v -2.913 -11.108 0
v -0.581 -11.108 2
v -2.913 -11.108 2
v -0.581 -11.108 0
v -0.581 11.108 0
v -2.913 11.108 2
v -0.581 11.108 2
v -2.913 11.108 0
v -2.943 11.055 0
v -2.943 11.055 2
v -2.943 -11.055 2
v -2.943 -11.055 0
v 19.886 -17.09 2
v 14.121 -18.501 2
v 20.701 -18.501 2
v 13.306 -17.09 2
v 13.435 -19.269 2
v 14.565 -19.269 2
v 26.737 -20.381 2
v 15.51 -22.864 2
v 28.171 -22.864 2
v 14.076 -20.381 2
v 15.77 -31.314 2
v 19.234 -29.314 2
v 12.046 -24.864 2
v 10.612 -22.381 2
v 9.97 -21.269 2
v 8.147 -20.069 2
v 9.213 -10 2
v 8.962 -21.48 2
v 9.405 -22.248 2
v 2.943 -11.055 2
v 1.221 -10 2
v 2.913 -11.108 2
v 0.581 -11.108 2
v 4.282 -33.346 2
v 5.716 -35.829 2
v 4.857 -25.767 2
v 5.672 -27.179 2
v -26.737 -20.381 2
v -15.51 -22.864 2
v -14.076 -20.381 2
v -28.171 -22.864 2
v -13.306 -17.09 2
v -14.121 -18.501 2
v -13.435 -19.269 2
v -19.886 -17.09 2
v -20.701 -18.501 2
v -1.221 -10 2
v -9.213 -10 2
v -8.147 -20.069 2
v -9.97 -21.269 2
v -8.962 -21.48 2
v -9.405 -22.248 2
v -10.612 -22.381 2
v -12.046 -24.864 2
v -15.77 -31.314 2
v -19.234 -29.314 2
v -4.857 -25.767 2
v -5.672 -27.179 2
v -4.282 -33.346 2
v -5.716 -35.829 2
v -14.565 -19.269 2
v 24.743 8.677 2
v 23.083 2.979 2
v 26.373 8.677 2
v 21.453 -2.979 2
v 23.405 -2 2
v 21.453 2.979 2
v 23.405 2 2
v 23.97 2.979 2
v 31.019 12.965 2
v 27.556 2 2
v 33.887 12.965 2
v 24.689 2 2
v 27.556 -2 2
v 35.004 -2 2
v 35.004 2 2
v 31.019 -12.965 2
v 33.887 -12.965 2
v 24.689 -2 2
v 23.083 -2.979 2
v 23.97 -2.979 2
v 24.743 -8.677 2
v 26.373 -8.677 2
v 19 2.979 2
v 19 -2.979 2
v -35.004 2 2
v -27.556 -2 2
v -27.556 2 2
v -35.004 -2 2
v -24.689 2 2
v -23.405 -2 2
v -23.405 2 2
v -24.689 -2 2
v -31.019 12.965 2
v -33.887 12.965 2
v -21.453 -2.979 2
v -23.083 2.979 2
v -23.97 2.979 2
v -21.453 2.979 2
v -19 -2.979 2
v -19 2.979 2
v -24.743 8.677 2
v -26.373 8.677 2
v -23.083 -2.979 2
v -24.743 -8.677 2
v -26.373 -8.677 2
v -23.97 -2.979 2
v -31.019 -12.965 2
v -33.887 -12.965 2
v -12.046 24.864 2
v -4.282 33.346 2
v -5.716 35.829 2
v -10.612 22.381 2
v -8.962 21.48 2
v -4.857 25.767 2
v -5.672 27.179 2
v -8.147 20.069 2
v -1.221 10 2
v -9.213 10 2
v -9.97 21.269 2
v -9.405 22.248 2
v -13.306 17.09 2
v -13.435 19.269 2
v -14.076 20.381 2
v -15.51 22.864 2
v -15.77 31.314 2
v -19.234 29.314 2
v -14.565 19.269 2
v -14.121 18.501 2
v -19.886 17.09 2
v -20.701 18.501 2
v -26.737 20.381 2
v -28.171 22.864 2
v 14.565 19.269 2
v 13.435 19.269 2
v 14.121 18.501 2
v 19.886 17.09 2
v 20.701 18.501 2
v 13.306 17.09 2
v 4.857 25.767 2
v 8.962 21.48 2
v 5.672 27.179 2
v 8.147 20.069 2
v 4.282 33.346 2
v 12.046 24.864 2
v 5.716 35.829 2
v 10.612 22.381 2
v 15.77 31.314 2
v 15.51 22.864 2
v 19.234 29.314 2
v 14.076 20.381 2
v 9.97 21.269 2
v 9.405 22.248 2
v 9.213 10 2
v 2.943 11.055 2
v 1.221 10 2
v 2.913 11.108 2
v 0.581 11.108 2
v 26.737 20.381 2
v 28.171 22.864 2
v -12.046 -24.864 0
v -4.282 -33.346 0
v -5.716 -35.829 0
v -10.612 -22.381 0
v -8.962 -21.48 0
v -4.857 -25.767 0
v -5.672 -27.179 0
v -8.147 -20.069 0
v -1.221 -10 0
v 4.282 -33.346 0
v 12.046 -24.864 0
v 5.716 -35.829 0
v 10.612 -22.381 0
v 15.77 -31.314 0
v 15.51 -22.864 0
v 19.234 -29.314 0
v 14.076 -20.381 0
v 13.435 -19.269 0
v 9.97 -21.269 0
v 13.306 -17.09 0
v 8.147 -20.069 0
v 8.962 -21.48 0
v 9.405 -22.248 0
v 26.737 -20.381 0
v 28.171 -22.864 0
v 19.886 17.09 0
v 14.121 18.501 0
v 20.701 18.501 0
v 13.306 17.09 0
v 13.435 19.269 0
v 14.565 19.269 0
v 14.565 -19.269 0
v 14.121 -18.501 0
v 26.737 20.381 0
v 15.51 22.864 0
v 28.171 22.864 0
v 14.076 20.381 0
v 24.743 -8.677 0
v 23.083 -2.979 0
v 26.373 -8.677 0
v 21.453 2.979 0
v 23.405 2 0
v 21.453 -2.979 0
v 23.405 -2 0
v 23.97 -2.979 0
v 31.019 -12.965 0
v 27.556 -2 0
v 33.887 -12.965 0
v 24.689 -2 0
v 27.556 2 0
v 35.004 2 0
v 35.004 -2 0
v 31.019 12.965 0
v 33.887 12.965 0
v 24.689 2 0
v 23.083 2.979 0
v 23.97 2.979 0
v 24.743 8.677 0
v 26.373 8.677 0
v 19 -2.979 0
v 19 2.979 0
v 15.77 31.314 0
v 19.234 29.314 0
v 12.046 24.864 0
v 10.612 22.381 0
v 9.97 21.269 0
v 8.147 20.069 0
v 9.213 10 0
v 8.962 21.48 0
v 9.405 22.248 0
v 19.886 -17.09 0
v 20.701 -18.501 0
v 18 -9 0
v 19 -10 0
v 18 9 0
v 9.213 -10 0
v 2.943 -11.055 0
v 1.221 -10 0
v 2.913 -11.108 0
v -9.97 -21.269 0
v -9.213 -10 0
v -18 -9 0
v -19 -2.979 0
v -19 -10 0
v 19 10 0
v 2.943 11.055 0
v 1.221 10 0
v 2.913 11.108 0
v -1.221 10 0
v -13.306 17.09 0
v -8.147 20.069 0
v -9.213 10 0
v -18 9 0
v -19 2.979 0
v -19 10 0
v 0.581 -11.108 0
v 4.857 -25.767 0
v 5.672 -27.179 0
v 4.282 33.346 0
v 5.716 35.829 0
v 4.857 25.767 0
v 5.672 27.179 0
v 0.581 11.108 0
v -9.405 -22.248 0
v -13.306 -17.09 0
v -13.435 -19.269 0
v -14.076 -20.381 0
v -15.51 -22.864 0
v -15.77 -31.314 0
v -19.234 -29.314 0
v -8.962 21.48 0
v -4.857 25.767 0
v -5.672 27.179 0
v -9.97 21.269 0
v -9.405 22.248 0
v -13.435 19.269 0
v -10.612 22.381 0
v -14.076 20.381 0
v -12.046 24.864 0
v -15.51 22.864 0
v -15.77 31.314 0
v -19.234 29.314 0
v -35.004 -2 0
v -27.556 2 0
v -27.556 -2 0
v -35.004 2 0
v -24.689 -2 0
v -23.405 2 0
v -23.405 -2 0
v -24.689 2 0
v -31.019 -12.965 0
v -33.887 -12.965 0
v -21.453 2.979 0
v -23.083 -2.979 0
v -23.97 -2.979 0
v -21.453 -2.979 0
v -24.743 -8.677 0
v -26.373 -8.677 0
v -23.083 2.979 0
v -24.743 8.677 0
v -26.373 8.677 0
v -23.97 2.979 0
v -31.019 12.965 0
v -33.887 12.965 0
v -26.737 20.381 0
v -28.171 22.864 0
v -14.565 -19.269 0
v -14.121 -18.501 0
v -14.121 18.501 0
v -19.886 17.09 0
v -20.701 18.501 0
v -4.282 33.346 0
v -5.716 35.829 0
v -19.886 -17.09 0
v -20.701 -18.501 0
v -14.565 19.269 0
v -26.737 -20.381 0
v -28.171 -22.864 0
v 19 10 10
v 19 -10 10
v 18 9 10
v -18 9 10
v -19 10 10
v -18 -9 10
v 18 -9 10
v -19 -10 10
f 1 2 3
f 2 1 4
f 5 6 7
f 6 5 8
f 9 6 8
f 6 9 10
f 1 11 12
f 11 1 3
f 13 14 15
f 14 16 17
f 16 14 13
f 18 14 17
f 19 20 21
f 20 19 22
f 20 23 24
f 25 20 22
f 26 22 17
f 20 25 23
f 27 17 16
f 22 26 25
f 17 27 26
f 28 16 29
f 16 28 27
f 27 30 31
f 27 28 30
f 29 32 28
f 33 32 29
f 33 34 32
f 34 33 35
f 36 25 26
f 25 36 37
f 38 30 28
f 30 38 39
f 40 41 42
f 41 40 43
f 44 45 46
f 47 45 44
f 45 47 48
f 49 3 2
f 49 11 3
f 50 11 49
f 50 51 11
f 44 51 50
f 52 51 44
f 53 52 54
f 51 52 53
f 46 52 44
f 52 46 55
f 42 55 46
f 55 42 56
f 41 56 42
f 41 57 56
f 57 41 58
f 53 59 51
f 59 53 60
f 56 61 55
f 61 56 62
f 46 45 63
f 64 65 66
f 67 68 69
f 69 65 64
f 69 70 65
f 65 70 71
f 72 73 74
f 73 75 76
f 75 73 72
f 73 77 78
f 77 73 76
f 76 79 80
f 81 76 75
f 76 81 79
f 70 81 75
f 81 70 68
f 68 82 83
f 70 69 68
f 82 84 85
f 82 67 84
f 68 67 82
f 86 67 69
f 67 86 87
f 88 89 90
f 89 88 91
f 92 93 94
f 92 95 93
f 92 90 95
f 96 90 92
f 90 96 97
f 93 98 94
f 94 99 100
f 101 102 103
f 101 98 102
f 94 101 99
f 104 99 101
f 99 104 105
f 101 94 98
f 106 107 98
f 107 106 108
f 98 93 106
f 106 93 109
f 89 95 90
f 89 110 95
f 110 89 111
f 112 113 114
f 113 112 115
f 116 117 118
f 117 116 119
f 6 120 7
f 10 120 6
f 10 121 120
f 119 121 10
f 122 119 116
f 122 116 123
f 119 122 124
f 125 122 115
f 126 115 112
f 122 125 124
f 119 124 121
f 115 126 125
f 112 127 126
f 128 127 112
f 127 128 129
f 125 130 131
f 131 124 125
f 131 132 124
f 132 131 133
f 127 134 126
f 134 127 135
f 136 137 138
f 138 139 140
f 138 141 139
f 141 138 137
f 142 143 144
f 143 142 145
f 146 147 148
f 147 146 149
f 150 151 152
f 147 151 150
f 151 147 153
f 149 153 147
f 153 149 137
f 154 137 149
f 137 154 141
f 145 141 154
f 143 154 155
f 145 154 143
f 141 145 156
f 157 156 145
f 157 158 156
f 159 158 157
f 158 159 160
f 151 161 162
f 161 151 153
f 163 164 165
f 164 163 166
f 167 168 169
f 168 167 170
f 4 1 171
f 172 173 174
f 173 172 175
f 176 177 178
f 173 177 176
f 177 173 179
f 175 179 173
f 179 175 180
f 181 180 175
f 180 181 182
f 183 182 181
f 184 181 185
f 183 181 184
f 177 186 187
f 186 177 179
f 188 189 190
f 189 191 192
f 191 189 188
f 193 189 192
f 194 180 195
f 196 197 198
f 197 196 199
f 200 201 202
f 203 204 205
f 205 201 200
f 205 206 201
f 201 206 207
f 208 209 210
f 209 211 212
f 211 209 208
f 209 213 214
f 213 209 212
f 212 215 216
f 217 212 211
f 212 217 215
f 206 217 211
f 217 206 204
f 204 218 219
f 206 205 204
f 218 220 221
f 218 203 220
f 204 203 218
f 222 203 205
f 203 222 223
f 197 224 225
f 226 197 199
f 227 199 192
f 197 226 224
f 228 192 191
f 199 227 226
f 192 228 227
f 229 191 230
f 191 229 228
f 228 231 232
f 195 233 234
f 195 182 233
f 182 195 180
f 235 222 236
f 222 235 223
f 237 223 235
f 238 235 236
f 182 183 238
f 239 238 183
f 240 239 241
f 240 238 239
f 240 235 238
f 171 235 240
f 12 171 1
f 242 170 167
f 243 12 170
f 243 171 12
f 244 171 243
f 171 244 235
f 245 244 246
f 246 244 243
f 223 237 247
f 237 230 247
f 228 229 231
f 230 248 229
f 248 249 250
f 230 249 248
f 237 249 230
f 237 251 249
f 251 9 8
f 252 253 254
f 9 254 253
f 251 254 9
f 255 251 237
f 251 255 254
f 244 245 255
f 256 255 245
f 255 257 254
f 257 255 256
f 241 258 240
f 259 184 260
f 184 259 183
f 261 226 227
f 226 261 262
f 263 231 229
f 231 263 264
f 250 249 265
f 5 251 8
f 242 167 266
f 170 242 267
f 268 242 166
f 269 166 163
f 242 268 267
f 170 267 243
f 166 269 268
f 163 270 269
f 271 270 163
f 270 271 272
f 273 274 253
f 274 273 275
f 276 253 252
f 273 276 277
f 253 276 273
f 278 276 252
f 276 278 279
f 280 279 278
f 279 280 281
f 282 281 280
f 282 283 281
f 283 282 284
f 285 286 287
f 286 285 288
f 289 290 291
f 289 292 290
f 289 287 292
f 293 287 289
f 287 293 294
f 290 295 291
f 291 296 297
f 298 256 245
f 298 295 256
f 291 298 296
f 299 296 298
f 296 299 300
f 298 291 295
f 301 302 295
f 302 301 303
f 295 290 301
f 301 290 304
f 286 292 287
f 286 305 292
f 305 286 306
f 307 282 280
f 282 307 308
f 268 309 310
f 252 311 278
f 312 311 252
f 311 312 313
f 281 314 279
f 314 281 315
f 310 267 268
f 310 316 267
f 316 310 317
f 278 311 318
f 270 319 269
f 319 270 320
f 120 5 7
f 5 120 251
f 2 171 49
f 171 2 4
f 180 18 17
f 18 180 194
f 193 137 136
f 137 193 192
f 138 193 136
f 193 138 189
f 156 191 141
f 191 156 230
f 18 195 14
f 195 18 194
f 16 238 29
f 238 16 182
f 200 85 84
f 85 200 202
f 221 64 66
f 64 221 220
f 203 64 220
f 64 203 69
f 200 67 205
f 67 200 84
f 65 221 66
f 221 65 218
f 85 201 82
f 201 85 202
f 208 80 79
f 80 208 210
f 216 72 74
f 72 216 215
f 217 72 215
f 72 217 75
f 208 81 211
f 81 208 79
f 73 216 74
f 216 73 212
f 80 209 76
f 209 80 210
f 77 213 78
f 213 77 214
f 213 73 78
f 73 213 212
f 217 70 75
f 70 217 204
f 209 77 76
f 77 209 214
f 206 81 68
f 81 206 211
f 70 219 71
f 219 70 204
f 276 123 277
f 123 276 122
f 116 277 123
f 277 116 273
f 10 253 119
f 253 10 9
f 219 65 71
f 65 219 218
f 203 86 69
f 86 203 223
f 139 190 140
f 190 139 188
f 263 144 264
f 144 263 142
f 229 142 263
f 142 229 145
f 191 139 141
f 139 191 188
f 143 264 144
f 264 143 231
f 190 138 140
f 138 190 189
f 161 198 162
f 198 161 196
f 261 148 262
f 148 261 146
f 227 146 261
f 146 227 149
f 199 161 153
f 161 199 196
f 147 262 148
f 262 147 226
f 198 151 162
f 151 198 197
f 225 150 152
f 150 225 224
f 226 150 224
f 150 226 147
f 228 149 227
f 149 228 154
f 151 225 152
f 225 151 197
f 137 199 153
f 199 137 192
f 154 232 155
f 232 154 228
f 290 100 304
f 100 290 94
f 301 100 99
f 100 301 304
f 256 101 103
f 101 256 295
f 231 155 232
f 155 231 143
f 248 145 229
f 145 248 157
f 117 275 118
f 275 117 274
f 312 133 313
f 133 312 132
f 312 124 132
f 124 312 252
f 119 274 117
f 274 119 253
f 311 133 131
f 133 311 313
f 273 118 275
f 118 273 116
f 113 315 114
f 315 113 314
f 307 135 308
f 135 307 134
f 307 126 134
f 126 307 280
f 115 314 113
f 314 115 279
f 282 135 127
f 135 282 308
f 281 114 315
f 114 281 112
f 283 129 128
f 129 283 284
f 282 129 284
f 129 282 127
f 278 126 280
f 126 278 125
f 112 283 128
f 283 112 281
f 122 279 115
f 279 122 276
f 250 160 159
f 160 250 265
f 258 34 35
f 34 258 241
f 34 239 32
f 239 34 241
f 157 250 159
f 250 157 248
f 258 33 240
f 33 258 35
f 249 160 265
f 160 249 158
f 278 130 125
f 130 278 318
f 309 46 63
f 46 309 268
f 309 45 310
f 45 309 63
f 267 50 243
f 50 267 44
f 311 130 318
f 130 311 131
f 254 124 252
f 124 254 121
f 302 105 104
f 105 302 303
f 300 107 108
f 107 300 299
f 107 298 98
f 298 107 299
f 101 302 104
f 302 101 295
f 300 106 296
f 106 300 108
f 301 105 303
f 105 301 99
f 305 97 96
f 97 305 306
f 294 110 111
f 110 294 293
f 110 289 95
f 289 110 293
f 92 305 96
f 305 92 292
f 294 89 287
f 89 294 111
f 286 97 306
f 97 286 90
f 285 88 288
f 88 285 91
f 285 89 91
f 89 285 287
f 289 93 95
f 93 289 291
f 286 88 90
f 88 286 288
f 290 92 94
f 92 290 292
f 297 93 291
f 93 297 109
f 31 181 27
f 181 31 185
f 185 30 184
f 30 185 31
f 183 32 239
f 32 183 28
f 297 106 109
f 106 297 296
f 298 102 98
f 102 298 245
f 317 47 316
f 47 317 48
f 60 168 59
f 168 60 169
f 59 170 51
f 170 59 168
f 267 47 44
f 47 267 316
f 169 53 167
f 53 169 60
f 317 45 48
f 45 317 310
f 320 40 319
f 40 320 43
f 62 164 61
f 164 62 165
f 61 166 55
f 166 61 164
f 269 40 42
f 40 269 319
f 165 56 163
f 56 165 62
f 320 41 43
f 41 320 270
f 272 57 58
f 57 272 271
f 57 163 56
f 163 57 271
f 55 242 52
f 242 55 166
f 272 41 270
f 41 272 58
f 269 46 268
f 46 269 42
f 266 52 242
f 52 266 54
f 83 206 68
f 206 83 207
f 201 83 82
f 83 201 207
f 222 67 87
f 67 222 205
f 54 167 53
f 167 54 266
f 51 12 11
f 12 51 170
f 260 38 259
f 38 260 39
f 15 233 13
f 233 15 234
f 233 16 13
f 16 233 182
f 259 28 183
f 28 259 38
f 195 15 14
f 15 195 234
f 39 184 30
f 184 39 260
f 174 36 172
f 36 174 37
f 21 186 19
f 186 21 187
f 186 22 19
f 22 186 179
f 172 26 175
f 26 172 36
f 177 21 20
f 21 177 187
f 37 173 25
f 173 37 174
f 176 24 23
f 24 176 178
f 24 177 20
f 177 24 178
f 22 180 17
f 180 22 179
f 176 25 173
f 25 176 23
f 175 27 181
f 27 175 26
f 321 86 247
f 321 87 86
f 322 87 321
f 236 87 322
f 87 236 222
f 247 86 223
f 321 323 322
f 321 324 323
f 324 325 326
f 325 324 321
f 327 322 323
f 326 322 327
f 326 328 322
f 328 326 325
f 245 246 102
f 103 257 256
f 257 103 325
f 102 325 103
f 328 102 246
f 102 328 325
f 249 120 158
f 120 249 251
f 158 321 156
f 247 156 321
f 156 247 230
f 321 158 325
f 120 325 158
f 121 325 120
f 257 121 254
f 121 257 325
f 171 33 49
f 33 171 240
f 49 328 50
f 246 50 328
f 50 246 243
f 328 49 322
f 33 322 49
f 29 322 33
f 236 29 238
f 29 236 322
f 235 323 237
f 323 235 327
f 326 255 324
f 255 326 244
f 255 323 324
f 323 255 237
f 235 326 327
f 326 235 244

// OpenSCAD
random_seed = floor(rands(1,9999999,1)[0]);
custom_seed = 0;
nBranches = 4;
// set the random snowflake seed
seed = (custom_seed==0) ? random_seed : custom_seed;
maxSteps=100*1;
randomWidth = rands(15,55,maxSteps,seed);
randomDepth = rands(1,6, maxSteps, seed);
randomSymmetry = rands(-2,2, seed);
branchLength = rands(30, 40, seed)[0];
branchThickness = 2;

raisinBoxWidth = 36;
raisinBoxDepth = 18;
raisinBoxHeight = 48;

echo(seed);

module snowflakyfy(){
    for (angle = [0, 60, 120, 180, 240, 300])
        rotate(angle)
            children();
}

module singleBranch(){
    translate([0, -0.5*2*branchThickness, 0])
        cube([branchLength, 2*branchThickness, branchThickness]);
    
    for (i = [0:nBranches]){  
        translate([branchLength/10 + branchLength/nBranches* i, 0, 0])
            secundaryBranche(randomWidth[i], randomDepth[i], 0);
    }

}


module secundaryBranche(size, thickness, half){
    difference(){
        cylinder(d = size, $fn=6, h=branchThickness);
            translate([thickness, ,0,0])
                cylinder(d = size, $fn=6, h=branchThickness);
        
        if (half < -1.5)
            translate([-size/2, 0, 0])
                cube(size);
        
        if (half > 1.5)      
            translate([-size/2, -size, 0])
                cube(size);          
    }

}

module drawSnowflake(){    
    //cylinder(d=6, $fn=6);
    bt = 2;
    difference(){
        union(){
            translate([-raisinBoxWidth/2-bt/2, -raisinBoxDepth/2-bt/2, 0]){
                cube([raisinBoxWidth+bt, raisinBoxDepth+bt, 10]);
            }        
            snowflakyfy()
                singleBranch();
        }
        translate([-raisinBoxWidth/2, -raisinBoxDepth/2, 0]){
            cube([raisinBoxWidth, raisinBoxDepth, raisinBoxHeight]);
        }
    }
}

drawSnowflake();
